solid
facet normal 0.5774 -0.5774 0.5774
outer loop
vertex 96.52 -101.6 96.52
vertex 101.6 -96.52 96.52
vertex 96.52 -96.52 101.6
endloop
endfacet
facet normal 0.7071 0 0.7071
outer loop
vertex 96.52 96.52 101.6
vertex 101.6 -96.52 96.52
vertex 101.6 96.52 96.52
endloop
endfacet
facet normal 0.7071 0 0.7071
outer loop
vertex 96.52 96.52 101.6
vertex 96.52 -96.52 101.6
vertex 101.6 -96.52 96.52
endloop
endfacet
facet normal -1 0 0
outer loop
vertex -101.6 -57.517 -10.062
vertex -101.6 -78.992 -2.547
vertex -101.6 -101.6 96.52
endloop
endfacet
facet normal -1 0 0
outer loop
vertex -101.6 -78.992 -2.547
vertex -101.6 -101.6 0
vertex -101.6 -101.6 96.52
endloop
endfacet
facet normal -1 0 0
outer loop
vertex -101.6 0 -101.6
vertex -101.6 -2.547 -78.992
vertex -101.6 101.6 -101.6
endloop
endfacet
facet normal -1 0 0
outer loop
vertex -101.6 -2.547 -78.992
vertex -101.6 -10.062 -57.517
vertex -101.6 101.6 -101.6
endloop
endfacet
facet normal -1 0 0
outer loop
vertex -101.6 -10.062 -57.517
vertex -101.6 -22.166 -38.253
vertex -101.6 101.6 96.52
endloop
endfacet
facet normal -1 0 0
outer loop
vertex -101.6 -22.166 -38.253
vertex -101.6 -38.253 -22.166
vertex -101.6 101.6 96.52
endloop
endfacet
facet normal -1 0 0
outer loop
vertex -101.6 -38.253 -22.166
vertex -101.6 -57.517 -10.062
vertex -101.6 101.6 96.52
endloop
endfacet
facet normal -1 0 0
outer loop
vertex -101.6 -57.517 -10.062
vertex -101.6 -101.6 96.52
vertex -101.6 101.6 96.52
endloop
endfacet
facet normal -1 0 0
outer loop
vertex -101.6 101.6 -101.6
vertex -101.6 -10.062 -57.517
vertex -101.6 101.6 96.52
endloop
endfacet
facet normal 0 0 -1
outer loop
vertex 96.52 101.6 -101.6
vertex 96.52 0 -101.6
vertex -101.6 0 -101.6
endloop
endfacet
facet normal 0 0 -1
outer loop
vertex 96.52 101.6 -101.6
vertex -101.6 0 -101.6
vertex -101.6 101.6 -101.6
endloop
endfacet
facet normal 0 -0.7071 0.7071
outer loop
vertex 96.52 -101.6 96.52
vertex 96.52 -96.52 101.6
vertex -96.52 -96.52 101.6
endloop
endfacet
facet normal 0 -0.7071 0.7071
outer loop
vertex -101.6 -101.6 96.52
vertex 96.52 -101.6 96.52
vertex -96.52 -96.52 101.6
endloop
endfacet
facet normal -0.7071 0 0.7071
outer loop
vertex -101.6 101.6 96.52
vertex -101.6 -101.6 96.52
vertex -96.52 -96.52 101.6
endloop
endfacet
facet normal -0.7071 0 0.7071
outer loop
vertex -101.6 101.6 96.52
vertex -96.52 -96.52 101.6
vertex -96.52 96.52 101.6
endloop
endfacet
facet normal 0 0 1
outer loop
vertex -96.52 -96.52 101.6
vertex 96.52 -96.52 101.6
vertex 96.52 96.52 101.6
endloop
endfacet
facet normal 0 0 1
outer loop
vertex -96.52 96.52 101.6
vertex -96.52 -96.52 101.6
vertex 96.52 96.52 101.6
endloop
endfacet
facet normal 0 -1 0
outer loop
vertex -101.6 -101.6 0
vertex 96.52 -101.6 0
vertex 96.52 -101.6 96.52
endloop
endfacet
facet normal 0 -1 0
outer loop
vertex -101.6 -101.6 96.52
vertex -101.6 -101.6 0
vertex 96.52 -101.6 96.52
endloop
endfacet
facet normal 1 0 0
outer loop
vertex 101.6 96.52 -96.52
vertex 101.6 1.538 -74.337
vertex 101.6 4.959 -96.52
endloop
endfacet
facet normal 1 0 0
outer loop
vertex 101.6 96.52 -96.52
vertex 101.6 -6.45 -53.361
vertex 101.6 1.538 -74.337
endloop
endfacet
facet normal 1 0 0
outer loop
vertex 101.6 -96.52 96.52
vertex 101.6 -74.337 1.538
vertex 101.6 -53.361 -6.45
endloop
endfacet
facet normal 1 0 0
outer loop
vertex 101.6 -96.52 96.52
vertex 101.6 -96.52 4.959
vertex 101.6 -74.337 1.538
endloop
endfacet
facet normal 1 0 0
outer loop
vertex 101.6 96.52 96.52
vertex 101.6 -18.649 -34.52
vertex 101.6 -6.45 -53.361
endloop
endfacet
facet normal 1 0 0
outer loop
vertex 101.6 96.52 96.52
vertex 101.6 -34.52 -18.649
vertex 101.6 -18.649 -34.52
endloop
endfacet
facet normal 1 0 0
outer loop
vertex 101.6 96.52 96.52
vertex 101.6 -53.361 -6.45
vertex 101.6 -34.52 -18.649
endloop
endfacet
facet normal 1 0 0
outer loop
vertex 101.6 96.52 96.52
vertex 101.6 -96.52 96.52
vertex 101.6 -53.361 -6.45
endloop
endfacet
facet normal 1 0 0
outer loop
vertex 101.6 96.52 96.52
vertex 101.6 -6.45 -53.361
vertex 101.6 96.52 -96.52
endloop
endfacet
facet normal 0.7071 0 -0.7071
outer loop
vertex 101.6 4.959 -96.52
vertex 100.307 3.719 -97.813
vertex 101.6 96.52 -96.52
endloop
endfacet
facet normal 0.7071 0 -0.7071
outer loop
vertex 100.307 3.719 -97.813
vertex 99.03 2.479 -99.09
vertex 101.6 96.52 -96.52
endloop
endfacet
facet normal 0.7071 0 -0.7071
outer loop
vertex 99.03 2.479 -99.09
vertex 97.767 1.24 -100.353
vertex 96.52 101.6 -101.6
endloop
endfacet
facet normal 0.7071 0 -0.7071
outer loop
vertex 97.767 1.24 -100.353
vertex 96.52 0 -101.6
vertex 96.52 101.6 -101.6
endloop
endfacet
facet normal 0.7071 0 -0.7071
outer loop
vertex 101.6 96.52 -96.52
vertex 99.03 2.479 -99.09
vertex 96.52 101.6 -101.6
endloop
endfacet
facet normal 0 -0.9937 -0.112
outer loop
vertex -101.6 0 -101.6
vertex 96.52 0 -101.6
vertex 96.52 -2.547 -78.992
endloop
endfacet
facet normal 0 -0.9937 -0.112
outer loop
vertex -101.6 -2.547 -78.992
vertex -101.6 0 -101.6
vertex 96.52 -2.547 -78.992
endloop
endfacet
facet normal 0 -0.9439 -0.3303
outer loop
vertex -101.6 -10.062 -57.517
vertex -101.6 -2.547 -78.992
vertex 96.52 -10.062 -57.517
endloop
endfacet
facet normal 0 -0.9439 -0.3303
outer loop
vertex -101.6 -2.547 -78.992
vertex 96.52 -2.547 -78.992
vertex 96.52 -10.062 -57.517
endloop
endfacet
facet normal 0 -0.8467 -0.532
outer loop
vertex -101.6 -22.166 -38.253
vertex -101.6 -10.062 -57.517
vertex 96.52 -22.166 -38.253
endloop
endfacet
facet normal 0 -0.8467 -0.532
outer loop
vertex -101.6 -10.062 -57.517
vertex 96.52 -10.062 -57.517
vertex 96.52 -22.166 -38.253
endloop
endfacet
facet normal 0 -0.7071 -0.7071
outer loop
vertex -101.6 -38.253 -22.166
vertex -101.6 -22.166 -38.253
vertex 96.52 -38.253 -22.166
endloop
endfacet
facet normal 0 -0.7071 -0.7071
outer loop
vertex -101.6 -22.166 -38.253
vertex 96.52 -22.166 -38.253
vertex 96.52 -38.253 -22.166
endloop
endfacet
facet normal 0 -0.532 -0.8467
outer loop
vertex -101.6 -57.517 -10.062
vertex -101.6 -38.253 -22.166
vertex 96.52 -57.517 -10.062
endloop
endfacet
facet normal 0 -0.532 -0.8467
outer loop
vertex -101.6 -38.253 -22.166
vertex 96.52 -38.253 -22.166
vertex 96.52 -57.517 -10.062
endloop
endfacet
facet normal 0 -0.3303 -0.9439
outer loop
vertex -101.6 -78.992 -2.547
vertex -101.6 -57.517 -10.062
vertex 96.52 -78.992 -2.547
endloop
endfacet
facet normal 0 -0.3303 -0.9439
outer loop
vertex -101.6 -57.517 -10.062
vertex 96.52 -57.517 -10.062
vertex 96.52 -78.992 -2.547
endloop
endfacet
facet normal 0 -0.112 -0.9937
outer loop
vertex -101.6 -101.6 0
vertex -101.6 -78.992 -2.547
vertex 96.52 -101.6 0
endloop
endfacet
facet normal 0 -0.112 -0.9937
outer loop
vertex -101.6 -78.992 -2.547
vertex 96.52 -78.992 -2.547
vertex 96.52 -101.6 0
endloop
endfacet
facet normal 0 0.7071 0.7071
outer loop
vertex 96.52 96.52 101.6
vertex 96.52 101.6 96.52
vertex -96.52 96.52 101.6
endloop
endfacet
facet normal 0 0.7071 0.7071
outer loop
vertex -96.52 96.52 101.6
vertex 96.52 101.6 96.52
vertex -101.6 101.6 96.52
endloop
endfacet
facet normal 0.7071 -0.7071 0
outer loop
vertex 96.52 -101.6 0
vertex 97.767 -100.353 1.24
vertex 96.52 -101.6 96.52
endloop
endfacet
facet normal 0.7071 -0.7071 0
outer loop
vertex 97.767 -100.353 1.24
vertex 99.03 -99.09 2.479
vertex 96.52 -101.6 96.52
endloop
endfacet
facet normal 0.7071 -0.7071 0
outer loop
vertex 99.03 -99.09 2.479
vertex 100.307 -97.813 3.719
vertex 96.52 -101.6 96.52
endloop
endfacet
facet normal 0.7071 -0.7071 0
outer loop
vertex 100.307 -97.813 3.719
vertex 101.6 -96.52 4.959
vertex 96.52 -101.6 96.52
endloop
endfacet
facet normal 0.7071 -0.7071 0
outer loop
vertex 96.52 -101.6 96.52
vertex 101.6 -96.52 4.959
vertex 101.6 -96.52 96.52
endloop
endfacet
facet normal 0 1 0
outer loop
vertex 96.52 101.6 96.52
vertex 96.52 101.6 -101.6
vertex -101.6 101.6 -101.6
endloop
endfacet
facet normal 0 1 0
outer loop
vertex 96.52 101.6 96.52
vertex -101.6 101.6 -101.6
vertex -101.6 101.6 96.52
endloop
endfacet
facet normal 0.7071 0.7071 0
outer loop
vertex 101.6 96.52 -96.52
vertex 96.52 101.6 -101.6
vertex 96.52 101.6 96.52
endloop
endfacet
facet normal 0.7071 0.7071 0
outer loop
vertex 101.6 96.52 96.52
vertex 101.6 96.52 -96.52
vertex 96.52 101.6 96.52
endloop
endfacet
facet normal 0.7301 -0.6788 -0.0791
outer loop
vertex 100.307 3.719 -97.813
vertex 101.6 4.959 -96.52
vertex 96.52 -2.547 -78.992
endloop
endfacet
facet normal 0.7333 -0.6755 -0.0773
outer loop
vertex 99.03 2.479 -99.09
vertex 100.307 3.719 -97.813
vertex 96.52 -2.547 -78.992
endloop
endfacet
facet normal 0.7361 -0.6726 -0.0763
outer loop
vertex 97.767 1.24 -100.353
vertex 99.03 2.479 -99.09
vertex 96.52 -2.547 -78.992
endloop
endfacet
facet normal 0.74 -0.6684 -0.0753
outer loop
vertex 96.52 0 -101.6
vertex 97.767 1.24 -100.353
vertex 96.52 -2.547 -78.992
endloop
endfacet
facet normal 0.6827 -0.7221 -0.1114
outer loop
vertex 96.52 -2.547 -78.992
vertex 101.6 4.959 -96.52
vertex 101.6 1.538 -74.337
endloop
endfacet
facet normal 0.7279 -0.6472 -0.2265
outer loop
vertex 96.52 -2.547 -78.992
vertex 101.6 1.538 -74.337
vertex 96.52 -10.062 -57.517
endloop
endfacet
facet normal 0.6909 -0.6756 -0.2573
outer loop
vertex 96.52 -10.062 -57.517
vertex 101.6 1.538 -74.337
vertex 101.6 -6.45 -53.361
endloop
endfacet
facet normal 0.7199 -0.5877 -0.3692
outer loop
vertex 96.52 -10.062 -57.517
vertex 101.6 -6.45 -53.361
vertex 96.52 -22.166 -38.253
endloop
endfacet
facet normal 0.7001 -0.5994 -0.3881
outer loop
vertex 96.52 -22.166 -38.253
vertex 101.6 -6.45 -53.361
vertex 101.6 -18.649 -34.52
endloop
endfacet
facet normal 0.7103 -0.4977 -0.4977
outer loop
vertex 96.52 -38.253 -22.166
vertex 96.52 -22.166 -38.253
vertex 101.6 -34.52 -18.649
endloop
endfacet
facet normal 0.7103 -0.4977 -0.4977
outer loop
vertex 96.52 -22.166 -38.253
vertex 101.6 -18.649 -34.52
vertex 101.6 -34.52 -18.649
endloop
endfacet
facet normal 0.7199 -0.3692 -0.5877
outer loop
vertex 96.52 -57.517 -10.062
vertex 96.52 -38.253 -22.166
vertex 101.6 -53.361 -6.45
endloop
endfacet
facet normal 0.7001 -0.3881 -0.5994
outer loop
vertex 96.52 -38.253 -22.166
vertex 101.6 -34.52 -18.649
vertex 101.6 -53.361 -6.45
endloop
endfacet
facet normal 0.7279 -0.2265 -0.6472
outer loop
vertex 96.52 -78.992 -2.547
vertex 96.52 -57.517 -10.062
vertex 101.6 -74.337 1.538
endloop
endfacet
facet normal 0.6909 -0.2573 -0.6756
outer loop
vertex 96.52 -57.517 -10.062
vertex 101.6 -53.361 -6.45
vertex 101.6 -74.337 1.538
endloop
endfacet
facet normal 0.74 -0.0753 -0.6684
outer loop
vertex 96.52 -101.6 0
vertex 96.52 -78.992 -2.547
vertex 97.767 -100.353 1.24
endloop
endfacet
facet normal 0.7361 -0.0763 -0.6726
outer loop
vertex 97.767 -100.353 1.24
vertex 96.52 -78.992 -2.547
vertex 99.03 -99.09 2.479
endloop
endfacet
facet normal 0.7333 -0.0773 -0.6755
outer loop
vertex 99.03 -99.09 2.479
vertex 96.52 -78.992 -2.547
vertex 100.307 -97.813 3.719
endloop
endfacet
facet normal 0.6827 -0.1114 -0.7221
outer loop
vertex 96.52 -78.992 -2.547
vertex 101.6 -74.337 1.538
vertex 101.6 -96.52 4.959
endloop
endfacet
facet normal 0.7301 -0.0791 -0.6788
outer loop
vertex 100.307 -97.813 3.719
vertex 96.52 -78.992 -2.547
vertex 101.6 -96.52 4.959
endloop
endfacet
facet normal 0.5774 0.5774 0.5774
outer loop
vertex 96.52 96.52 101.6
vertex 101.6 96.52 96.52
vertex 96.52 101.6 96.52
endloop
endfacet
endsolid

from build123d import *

# Parameters (mm, degrees)
F0_W     = 203.2
F0_H     = 203.2
F1_DEPTH = 101.6
F2_R     = 101.6
F3_DEPTH = 203.201
F4_SIZE  = 5.08


with BuildPart() as f1:
    # F0 (on Right) → F1 (new body, symmetric)
    with BuildSketch(Plane.YZ):
        Rectangle(F0_W, F0_H)
    extrude(amount=F1_DEPTH, both=True)

    # F2 (on face) → F3 (cut, through all)
    with BuildSketch(Plane.YZ.offset(101.6)):
        with Locations((-101.6, -101.6)):
            Circle(F2_R)
    extrude(amount=-F3_DEPTH, mode=Mode.SUBTRACT)

    # F4
    f4_edges = [f1.edges().sort_by_distance(p)[0] for p in [
        (101.6, 0, 101.6),
        (101.6, 101.6, 0),
        (101.6, 50.8, -101.6),
        (101.6, -29.757951, -29.757951),
        (101.6, -101.6, 50.8),
        (-101.6, 0, 101.6),
        (0, -101.6, 101.6),
        (0, 101.6, 101.6),
    ]]
    chamfer(f4_edges, length=F4_SIZE)


solid = f1.part
